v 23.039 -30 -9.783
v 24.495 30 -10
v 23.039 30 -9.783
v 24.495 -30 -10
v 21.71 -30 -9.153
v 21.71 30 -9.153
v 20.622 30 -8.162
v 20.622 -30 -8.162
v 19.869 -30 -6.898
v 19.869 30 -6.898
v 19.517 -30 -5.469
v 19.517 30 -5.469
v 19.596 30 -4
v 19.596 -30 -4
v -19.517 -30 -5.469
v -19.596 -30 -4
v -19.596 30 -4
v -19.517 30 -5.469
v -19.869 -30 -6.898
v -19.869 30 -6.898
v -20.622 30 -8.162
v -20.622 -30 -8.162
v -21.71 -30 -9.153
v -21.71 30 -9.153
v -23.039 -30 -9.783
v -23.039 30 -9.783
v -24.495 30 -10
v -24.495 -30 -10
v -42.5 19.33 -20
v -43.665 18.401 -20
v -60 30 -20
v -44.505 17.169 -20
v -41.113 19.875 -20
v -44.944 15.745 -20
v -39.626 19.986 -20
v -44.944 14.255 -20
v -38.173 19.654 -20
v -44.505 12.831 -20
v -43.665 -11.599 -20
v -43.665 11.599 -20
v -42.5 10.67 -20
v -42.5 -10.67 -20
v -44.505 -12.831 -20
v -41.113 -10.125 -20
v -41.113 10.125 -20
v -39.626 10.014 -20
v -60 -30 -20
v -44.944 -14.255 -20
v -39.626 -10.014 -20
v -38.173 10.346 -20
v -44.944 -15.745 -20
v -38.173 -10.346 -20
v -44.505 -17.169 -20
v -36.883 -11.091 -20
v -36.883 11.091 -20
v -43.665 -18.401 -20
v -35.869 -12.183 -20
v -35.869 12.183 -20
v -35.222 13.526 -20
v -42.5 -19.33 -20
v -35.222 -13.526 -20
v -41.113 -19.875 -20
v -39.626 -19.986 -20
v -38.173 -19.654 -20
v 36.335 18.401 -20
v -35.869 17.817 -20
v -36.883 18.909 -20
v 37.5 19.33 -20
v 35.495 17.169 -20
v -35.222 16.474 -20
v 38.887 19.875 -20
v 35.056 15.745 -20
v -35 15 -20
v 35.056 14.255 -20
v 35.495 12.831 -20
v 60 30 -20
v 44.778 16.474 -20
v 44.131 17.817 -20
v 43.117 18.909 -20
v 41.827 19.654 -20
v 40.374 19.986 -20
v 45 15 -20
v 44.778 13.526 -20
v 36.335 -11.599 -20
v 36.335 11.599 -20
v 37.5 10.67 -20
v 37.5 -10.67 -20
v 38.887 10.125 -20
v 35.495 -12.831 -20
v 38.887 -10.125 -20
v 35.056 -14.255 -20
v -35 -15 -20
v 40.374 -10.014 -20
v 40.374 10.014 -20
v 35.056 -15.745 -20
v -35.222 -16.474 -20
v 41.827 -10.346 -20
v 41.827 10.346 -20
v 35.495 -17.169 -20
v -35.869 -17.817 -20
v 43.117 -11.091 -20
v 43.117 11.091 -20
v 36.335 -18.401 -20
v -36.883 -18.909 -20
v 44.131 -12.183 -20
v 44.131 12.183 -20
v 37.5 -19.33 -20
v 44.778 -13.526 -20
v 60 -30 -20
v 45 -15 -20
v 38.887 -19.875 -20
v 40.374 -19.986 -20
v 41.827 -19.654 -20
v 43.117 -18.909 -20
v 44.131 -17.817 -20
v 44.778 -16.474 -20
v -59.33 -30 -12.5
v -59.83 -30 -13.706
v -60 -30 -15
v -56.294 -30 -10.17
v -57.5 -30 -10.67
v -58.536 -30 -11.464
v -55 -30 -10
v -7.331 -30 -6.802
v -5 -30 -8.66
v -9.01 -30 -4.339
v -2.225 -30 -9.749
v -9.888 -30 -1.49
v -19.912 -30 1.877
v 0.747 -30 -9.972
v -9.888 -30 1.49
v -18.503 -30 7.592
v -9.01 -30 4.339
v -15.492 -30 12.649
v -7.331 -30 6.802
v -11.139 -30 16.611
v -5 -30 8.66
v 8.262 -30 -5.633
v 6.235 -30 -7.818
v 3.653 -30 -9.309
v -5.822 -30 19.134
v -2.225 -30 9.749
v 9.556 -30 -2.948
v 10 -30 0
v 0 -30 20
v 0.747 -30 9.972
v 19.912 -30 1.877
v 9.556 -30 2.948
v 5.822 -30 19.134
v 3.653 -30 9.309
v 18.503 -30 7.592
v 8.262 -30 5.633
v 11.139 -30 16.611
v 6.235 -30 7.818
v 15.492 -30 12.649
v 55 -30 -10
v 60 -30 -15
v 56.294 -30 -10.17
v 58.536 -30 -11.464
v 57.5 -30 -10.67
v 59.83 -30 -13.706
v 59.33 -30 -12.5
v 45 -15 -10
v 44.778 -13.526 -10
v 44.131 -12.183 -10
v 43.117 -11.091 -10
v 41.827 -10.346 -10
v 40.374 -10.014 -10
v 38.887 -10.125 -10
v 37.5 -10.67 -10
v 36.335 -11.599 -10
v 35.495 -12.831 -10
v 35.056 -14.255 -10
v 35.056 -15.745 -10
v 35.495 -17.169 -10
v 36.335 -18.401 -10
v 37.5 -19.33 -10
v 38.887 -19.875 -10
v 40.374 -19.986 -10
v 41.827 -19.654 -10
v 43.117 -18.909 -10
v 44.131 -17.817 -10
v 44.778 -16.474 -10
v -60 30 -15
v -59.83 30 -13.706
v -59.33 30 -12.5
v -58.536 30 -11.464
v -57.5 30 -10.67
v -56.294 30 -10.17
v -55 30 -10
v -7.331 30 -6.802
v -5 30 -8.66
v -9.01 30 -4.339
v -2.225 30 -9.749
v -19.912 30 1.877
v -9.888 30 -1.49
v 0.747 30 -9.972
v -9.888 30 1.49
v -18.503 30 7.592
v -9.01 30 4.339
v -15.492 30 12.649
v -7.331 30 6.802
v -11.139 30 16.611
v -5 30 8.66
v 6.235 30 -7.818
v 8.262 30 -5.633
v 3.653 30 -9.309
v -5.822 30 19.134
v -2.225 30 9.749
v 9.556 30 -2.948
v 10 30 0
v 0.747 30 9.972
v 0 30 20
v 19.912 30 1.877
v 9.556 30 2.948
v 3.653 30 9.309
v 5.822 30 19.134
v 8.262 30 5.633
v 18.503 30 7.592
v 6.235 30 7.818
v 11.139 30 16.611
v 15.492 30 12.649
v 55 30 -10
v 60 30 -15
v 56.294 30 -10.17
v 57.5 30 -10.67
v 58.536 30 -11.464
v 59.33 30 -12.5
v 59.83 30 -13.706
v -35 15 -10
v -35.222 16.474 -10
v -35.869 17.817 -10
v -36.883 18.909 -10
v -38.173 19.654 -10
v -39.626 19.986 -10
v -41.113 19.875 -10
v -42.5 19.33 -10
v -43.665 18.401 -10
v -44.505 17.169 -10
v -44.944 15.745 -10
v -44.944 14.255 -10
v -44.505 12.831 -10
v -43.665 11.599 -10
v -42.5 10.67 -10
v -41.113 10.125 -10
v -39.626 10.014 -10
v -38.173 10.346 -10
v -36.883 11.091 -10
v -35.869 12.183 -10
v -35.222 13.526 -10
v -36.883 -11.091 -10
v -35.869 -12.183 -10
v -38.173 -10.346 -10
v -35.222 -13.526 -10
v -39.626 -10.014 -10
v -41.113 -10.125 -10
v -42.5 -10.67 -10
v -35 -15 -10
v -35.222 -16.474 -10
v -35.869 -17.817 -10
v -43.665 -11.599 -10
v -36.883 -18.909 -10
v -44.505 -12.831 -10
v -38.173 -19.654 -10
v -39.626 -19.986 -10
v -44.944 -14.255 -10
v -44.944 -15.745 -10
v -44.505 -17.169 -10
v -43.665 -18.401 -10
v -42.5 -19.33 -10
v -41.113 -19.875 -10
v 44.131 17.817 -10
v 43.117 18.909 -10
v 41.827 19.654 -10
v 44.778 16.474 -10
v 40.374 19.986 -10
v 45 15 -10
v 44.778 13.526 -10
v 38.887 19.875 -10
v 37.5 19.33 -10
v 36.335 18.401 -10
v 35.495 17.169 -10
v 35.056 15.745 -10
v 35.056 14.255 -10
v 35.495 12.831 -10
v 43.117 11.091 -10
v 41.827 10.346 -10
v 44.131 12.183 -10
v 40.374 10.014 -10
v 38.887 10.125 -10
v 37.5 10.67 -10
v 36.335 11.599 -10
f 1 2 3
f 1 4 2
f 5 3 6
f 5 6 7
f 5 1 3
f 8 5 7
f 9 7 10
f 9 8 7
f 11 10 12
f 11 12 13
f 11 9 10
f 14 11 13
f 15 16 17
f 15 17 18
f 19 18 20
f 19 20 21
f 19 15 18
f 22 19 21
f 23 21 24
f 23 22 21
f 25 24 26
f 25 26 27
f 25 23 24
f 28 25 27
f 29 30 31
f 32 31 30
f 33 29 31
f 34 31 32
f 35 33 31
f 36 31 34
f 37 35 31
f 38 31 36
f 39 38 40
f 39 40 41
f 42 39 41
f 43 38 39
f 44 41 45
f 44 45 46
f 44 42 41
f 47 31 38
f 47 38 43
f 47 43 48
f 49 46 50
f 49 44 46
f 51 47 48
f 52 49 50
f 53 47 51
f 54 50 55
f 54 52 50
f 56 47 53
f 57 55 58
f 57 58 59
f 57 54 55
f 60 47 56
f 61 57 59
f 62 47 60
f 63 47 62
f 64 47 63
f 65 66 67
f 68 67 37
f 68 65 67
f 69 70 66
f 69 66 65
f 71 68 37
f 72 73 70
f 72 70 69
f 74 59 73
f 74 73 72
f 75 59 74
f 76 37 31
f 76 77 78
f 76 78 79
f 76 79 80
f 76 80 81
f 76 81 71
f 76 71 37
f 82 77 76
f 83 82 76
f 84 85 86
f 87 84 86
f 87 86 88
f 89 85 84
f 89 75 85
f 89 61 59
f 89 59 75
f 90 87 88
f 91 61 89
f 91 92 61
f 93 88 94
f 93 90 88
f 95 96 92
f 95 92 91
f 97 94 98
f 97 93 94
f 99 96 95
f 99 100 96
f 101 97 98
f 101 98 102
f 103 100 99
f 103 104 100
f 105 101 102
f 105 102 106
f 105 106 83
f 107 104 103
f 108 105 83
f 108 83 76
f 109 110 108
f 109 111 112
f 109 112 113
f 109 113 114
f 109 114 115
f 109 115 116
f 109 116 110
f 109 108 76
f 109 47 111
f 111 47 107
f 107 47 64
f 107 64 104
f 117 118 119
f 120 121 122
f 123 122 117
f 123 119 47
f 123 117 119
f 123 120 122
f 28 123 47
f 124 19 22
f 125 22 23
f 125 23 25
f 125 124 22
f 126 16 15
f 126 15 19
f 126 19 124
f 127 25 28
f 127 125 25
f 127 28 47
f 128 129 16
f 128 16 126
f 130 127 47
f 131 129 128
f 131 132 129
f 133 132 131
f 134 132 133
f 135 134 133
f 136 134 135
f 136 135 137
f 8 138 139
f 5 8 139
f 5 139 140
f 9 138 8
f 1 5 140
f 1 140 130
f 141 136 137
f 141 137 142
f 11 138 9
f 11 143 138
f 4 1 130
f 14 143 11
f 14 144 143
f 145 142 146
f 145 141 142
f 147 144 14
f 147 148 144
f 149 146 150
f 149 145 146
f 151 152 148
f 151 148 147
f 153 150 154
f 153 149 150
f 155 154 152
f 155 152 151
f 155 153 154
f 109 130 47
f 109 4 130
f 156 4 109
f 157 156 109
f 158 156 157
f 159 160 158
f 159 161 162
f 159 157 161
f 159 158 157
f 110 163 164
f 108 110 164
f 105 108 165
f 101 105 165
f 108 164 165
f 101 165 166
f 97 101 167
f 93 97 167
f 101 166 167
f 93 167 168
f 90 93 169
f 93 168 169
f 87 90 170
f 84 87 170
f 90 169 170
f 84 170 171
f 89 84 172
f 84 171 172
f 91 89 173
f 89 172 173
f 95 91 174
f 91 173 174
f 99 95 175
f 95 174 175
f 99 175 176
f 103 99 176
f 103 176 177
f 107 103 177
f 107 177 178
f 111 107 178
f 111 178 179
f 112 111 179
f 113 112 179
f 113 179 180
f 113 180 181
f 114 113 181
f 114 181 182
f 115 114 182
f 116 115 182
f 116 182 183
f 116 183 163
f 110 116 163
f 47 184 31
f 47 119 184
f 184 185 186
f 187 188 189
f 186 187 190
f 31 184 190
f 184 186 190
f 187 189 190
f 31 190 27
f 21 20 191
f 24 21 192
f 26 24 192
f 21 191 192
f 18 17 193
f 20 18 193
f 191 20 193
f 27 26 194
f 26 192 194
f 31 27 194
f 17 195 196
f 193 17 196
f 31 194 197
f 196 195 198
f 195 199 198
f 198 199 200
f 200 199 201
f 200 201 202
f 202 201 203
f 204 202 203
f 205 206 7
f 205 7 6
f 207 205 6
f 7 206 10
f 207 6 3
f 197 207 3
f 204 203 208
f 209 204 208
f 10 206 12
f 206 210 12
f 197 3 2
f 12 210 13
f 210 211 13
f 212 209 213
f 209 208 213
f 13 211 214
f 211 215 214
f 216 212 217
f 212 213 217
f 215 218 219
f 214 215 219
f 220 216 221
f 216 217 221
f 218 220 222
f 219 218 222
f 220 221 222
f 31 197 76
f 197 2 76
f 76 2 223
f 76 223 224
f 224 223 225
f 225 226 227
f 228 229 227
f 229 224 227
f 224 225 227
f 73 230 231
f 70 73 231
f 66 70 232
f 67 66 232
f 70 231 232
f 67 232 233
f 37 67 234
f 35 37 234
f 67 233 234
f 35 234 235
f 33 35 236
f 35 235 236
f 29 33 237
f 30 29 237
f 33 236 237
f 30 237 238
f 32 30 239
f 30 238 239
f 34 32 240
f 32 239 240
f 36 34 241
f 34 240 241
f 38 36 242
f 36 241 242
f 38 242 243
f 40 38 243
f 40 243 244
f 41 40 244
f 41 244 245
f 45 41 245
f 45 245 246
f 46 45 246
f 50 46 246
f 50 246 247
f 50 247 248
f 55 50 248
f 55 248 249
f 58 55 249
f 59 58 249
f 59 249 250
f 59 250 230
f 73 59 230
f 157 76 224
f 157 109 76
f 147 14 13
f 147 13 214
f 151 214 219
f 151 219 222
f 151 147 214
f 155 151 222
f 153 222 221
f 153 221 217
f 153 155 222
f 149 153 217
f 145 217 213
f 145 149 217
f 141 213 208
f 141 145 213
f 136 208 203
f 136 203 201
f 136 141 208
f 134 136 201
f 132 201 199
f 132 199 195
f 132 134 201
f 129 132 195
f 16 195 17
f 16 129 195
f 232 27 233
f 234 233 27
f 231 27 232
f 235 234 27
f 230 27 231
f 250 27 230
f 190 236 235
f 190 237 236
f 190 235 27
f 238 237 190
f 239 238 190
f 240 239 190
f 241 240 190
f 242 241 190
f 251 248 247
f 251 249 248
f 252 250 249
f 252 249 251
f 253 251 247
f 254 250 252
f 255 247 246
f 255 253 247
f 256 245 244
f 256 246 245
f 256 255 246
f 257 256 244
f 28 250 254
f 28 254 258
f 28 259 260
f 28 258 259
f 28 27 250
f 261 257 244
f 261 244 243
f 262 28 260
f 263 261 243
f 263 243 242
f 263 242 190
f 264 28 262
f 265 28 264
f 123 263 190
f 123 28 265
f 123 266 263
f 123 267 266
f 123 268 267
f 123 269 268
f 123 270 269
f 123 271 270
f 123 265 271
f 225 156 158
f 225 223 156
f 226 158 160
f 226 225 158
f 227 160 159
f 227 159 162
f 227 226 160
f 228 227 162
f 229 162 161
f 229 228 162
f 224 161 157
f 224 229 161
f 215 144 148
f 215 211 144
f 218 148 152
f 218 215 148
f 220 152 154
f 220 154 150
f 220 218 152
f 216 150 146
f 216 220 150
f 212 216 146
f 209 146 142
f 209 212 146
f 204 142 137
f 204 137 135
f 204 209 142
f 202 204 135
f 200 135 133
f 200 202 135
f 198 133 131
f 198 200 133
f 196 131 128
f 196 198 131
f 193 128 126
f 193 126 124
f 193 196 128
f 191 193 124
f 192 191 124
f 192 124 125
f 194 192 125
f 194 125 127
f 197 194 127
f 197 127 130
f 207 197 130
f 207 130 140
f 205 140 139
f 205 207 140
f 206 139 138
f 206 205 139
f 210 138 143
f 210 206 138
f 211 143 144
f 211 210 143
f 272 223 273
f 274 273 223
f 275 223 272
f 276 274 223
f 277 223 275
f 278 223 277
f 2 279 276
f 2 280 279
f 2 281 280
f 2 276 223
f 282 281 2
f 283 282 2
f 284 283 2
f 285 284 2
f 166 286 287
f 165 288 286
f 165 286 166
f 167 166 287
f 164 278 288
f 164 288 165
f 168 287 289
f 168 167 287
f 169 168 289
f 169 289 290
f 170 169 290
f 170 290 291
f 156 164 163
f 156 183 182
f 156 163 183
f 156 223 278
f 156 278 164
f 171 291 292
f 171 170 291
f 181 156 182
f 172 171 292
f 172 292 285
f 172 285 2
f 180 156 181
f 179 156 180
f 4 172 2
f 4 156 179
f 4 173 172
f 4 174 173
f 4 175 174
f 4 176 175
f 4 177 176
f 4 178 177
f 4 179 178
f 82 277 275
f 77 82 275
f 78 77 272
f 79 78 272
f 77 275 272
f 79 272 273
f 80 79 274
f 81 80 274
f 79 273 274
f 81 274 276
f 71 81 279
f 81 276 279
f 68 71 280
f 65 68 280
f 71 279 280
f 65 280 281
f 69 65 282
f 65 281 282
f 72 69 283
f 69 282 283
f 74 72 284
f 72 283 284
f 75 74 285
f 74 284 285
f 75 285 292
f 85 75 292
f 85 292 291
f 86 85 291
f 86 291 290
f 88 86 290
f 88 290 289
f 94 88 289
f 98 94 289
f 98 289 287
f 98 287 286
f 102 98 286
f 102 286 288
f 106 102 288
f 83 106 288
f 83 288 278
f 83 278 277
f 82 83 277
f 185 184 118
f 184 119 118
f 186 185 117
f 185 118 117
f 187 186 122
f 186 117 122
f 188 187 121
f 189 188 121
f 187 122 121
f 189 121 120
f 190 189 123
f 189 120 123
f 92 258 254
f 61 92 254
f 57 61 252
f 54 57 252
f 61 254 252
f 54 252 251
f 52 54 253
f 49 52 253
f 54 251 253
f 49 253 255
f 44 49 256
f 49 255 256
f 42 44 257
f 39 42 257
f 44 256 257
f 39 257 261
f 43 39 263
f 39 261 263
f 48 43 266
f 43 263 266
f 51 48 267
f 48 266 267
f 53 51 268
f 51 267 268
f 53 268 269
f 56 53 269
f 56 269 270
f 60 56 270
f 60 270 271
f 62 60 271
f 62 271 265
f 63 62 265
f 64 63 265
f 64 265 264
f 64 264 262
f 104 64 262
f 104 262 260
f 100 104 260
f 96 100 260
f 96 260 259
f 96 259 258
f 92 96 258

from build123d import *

# Parameters (mm, degrees)
F0_R     = 10
F1_DEPTH = 30
F2_R     = 5
F3_R     = 5
F4_DEPTH = 10.001


with BuildPart() as f1:
    # F0 (on Front) → F1 (new body, symmetric)
    with BuildSketch(Plane.XZ):
        with BuildLine():
            ThreePointArc((24.494897, -10), (20.621914, -8.162278), (19.595918, -4))
            ThreePointArc((19.595918, -4), (0, 20), (-19.595918, -4))
            ThreePointArc((-19.595918, -4), (-20.621914, -8.162278), (-24.494897, -10))
            Line((-24.494897, -10), (-60, -10))
            Line((-60, -10), (-60, -20))
            Line((-60, -20), (60, -20))
            Line((60, -20), (60, -10))
            Line((60, -10), (24.494897, -10))
        make_face()
        Circle(F0_R, mode=Mode.SUBTRACT)
    extrude(amount=F1_DEPTH, both=True)

    # F2
    f2_edges = [f1.edges().sort_by_distance(p)[0] for p in [
        (60, 0, -10),
        (-60, 0, -10),
    ]]
    fillet(f2_edges, radius=F2_R)

    # F3 (on face) → F4 (cut, through all)
    with BuildSketch(Plane.XY.offset(-10)):
        with Locations((-40, 15)):
            Circle(F3_R)
        with Locations((-40, -15)):
            Circle(F3_R)
        with Locations((40, -15)):
            Circle(F3_R)
        with Locations((40, 15)):
            Circle(F3_R)
    extrude(amount=-F4_DEPTH, mode=Mode.SUBTRACT)


solid = f1.part
